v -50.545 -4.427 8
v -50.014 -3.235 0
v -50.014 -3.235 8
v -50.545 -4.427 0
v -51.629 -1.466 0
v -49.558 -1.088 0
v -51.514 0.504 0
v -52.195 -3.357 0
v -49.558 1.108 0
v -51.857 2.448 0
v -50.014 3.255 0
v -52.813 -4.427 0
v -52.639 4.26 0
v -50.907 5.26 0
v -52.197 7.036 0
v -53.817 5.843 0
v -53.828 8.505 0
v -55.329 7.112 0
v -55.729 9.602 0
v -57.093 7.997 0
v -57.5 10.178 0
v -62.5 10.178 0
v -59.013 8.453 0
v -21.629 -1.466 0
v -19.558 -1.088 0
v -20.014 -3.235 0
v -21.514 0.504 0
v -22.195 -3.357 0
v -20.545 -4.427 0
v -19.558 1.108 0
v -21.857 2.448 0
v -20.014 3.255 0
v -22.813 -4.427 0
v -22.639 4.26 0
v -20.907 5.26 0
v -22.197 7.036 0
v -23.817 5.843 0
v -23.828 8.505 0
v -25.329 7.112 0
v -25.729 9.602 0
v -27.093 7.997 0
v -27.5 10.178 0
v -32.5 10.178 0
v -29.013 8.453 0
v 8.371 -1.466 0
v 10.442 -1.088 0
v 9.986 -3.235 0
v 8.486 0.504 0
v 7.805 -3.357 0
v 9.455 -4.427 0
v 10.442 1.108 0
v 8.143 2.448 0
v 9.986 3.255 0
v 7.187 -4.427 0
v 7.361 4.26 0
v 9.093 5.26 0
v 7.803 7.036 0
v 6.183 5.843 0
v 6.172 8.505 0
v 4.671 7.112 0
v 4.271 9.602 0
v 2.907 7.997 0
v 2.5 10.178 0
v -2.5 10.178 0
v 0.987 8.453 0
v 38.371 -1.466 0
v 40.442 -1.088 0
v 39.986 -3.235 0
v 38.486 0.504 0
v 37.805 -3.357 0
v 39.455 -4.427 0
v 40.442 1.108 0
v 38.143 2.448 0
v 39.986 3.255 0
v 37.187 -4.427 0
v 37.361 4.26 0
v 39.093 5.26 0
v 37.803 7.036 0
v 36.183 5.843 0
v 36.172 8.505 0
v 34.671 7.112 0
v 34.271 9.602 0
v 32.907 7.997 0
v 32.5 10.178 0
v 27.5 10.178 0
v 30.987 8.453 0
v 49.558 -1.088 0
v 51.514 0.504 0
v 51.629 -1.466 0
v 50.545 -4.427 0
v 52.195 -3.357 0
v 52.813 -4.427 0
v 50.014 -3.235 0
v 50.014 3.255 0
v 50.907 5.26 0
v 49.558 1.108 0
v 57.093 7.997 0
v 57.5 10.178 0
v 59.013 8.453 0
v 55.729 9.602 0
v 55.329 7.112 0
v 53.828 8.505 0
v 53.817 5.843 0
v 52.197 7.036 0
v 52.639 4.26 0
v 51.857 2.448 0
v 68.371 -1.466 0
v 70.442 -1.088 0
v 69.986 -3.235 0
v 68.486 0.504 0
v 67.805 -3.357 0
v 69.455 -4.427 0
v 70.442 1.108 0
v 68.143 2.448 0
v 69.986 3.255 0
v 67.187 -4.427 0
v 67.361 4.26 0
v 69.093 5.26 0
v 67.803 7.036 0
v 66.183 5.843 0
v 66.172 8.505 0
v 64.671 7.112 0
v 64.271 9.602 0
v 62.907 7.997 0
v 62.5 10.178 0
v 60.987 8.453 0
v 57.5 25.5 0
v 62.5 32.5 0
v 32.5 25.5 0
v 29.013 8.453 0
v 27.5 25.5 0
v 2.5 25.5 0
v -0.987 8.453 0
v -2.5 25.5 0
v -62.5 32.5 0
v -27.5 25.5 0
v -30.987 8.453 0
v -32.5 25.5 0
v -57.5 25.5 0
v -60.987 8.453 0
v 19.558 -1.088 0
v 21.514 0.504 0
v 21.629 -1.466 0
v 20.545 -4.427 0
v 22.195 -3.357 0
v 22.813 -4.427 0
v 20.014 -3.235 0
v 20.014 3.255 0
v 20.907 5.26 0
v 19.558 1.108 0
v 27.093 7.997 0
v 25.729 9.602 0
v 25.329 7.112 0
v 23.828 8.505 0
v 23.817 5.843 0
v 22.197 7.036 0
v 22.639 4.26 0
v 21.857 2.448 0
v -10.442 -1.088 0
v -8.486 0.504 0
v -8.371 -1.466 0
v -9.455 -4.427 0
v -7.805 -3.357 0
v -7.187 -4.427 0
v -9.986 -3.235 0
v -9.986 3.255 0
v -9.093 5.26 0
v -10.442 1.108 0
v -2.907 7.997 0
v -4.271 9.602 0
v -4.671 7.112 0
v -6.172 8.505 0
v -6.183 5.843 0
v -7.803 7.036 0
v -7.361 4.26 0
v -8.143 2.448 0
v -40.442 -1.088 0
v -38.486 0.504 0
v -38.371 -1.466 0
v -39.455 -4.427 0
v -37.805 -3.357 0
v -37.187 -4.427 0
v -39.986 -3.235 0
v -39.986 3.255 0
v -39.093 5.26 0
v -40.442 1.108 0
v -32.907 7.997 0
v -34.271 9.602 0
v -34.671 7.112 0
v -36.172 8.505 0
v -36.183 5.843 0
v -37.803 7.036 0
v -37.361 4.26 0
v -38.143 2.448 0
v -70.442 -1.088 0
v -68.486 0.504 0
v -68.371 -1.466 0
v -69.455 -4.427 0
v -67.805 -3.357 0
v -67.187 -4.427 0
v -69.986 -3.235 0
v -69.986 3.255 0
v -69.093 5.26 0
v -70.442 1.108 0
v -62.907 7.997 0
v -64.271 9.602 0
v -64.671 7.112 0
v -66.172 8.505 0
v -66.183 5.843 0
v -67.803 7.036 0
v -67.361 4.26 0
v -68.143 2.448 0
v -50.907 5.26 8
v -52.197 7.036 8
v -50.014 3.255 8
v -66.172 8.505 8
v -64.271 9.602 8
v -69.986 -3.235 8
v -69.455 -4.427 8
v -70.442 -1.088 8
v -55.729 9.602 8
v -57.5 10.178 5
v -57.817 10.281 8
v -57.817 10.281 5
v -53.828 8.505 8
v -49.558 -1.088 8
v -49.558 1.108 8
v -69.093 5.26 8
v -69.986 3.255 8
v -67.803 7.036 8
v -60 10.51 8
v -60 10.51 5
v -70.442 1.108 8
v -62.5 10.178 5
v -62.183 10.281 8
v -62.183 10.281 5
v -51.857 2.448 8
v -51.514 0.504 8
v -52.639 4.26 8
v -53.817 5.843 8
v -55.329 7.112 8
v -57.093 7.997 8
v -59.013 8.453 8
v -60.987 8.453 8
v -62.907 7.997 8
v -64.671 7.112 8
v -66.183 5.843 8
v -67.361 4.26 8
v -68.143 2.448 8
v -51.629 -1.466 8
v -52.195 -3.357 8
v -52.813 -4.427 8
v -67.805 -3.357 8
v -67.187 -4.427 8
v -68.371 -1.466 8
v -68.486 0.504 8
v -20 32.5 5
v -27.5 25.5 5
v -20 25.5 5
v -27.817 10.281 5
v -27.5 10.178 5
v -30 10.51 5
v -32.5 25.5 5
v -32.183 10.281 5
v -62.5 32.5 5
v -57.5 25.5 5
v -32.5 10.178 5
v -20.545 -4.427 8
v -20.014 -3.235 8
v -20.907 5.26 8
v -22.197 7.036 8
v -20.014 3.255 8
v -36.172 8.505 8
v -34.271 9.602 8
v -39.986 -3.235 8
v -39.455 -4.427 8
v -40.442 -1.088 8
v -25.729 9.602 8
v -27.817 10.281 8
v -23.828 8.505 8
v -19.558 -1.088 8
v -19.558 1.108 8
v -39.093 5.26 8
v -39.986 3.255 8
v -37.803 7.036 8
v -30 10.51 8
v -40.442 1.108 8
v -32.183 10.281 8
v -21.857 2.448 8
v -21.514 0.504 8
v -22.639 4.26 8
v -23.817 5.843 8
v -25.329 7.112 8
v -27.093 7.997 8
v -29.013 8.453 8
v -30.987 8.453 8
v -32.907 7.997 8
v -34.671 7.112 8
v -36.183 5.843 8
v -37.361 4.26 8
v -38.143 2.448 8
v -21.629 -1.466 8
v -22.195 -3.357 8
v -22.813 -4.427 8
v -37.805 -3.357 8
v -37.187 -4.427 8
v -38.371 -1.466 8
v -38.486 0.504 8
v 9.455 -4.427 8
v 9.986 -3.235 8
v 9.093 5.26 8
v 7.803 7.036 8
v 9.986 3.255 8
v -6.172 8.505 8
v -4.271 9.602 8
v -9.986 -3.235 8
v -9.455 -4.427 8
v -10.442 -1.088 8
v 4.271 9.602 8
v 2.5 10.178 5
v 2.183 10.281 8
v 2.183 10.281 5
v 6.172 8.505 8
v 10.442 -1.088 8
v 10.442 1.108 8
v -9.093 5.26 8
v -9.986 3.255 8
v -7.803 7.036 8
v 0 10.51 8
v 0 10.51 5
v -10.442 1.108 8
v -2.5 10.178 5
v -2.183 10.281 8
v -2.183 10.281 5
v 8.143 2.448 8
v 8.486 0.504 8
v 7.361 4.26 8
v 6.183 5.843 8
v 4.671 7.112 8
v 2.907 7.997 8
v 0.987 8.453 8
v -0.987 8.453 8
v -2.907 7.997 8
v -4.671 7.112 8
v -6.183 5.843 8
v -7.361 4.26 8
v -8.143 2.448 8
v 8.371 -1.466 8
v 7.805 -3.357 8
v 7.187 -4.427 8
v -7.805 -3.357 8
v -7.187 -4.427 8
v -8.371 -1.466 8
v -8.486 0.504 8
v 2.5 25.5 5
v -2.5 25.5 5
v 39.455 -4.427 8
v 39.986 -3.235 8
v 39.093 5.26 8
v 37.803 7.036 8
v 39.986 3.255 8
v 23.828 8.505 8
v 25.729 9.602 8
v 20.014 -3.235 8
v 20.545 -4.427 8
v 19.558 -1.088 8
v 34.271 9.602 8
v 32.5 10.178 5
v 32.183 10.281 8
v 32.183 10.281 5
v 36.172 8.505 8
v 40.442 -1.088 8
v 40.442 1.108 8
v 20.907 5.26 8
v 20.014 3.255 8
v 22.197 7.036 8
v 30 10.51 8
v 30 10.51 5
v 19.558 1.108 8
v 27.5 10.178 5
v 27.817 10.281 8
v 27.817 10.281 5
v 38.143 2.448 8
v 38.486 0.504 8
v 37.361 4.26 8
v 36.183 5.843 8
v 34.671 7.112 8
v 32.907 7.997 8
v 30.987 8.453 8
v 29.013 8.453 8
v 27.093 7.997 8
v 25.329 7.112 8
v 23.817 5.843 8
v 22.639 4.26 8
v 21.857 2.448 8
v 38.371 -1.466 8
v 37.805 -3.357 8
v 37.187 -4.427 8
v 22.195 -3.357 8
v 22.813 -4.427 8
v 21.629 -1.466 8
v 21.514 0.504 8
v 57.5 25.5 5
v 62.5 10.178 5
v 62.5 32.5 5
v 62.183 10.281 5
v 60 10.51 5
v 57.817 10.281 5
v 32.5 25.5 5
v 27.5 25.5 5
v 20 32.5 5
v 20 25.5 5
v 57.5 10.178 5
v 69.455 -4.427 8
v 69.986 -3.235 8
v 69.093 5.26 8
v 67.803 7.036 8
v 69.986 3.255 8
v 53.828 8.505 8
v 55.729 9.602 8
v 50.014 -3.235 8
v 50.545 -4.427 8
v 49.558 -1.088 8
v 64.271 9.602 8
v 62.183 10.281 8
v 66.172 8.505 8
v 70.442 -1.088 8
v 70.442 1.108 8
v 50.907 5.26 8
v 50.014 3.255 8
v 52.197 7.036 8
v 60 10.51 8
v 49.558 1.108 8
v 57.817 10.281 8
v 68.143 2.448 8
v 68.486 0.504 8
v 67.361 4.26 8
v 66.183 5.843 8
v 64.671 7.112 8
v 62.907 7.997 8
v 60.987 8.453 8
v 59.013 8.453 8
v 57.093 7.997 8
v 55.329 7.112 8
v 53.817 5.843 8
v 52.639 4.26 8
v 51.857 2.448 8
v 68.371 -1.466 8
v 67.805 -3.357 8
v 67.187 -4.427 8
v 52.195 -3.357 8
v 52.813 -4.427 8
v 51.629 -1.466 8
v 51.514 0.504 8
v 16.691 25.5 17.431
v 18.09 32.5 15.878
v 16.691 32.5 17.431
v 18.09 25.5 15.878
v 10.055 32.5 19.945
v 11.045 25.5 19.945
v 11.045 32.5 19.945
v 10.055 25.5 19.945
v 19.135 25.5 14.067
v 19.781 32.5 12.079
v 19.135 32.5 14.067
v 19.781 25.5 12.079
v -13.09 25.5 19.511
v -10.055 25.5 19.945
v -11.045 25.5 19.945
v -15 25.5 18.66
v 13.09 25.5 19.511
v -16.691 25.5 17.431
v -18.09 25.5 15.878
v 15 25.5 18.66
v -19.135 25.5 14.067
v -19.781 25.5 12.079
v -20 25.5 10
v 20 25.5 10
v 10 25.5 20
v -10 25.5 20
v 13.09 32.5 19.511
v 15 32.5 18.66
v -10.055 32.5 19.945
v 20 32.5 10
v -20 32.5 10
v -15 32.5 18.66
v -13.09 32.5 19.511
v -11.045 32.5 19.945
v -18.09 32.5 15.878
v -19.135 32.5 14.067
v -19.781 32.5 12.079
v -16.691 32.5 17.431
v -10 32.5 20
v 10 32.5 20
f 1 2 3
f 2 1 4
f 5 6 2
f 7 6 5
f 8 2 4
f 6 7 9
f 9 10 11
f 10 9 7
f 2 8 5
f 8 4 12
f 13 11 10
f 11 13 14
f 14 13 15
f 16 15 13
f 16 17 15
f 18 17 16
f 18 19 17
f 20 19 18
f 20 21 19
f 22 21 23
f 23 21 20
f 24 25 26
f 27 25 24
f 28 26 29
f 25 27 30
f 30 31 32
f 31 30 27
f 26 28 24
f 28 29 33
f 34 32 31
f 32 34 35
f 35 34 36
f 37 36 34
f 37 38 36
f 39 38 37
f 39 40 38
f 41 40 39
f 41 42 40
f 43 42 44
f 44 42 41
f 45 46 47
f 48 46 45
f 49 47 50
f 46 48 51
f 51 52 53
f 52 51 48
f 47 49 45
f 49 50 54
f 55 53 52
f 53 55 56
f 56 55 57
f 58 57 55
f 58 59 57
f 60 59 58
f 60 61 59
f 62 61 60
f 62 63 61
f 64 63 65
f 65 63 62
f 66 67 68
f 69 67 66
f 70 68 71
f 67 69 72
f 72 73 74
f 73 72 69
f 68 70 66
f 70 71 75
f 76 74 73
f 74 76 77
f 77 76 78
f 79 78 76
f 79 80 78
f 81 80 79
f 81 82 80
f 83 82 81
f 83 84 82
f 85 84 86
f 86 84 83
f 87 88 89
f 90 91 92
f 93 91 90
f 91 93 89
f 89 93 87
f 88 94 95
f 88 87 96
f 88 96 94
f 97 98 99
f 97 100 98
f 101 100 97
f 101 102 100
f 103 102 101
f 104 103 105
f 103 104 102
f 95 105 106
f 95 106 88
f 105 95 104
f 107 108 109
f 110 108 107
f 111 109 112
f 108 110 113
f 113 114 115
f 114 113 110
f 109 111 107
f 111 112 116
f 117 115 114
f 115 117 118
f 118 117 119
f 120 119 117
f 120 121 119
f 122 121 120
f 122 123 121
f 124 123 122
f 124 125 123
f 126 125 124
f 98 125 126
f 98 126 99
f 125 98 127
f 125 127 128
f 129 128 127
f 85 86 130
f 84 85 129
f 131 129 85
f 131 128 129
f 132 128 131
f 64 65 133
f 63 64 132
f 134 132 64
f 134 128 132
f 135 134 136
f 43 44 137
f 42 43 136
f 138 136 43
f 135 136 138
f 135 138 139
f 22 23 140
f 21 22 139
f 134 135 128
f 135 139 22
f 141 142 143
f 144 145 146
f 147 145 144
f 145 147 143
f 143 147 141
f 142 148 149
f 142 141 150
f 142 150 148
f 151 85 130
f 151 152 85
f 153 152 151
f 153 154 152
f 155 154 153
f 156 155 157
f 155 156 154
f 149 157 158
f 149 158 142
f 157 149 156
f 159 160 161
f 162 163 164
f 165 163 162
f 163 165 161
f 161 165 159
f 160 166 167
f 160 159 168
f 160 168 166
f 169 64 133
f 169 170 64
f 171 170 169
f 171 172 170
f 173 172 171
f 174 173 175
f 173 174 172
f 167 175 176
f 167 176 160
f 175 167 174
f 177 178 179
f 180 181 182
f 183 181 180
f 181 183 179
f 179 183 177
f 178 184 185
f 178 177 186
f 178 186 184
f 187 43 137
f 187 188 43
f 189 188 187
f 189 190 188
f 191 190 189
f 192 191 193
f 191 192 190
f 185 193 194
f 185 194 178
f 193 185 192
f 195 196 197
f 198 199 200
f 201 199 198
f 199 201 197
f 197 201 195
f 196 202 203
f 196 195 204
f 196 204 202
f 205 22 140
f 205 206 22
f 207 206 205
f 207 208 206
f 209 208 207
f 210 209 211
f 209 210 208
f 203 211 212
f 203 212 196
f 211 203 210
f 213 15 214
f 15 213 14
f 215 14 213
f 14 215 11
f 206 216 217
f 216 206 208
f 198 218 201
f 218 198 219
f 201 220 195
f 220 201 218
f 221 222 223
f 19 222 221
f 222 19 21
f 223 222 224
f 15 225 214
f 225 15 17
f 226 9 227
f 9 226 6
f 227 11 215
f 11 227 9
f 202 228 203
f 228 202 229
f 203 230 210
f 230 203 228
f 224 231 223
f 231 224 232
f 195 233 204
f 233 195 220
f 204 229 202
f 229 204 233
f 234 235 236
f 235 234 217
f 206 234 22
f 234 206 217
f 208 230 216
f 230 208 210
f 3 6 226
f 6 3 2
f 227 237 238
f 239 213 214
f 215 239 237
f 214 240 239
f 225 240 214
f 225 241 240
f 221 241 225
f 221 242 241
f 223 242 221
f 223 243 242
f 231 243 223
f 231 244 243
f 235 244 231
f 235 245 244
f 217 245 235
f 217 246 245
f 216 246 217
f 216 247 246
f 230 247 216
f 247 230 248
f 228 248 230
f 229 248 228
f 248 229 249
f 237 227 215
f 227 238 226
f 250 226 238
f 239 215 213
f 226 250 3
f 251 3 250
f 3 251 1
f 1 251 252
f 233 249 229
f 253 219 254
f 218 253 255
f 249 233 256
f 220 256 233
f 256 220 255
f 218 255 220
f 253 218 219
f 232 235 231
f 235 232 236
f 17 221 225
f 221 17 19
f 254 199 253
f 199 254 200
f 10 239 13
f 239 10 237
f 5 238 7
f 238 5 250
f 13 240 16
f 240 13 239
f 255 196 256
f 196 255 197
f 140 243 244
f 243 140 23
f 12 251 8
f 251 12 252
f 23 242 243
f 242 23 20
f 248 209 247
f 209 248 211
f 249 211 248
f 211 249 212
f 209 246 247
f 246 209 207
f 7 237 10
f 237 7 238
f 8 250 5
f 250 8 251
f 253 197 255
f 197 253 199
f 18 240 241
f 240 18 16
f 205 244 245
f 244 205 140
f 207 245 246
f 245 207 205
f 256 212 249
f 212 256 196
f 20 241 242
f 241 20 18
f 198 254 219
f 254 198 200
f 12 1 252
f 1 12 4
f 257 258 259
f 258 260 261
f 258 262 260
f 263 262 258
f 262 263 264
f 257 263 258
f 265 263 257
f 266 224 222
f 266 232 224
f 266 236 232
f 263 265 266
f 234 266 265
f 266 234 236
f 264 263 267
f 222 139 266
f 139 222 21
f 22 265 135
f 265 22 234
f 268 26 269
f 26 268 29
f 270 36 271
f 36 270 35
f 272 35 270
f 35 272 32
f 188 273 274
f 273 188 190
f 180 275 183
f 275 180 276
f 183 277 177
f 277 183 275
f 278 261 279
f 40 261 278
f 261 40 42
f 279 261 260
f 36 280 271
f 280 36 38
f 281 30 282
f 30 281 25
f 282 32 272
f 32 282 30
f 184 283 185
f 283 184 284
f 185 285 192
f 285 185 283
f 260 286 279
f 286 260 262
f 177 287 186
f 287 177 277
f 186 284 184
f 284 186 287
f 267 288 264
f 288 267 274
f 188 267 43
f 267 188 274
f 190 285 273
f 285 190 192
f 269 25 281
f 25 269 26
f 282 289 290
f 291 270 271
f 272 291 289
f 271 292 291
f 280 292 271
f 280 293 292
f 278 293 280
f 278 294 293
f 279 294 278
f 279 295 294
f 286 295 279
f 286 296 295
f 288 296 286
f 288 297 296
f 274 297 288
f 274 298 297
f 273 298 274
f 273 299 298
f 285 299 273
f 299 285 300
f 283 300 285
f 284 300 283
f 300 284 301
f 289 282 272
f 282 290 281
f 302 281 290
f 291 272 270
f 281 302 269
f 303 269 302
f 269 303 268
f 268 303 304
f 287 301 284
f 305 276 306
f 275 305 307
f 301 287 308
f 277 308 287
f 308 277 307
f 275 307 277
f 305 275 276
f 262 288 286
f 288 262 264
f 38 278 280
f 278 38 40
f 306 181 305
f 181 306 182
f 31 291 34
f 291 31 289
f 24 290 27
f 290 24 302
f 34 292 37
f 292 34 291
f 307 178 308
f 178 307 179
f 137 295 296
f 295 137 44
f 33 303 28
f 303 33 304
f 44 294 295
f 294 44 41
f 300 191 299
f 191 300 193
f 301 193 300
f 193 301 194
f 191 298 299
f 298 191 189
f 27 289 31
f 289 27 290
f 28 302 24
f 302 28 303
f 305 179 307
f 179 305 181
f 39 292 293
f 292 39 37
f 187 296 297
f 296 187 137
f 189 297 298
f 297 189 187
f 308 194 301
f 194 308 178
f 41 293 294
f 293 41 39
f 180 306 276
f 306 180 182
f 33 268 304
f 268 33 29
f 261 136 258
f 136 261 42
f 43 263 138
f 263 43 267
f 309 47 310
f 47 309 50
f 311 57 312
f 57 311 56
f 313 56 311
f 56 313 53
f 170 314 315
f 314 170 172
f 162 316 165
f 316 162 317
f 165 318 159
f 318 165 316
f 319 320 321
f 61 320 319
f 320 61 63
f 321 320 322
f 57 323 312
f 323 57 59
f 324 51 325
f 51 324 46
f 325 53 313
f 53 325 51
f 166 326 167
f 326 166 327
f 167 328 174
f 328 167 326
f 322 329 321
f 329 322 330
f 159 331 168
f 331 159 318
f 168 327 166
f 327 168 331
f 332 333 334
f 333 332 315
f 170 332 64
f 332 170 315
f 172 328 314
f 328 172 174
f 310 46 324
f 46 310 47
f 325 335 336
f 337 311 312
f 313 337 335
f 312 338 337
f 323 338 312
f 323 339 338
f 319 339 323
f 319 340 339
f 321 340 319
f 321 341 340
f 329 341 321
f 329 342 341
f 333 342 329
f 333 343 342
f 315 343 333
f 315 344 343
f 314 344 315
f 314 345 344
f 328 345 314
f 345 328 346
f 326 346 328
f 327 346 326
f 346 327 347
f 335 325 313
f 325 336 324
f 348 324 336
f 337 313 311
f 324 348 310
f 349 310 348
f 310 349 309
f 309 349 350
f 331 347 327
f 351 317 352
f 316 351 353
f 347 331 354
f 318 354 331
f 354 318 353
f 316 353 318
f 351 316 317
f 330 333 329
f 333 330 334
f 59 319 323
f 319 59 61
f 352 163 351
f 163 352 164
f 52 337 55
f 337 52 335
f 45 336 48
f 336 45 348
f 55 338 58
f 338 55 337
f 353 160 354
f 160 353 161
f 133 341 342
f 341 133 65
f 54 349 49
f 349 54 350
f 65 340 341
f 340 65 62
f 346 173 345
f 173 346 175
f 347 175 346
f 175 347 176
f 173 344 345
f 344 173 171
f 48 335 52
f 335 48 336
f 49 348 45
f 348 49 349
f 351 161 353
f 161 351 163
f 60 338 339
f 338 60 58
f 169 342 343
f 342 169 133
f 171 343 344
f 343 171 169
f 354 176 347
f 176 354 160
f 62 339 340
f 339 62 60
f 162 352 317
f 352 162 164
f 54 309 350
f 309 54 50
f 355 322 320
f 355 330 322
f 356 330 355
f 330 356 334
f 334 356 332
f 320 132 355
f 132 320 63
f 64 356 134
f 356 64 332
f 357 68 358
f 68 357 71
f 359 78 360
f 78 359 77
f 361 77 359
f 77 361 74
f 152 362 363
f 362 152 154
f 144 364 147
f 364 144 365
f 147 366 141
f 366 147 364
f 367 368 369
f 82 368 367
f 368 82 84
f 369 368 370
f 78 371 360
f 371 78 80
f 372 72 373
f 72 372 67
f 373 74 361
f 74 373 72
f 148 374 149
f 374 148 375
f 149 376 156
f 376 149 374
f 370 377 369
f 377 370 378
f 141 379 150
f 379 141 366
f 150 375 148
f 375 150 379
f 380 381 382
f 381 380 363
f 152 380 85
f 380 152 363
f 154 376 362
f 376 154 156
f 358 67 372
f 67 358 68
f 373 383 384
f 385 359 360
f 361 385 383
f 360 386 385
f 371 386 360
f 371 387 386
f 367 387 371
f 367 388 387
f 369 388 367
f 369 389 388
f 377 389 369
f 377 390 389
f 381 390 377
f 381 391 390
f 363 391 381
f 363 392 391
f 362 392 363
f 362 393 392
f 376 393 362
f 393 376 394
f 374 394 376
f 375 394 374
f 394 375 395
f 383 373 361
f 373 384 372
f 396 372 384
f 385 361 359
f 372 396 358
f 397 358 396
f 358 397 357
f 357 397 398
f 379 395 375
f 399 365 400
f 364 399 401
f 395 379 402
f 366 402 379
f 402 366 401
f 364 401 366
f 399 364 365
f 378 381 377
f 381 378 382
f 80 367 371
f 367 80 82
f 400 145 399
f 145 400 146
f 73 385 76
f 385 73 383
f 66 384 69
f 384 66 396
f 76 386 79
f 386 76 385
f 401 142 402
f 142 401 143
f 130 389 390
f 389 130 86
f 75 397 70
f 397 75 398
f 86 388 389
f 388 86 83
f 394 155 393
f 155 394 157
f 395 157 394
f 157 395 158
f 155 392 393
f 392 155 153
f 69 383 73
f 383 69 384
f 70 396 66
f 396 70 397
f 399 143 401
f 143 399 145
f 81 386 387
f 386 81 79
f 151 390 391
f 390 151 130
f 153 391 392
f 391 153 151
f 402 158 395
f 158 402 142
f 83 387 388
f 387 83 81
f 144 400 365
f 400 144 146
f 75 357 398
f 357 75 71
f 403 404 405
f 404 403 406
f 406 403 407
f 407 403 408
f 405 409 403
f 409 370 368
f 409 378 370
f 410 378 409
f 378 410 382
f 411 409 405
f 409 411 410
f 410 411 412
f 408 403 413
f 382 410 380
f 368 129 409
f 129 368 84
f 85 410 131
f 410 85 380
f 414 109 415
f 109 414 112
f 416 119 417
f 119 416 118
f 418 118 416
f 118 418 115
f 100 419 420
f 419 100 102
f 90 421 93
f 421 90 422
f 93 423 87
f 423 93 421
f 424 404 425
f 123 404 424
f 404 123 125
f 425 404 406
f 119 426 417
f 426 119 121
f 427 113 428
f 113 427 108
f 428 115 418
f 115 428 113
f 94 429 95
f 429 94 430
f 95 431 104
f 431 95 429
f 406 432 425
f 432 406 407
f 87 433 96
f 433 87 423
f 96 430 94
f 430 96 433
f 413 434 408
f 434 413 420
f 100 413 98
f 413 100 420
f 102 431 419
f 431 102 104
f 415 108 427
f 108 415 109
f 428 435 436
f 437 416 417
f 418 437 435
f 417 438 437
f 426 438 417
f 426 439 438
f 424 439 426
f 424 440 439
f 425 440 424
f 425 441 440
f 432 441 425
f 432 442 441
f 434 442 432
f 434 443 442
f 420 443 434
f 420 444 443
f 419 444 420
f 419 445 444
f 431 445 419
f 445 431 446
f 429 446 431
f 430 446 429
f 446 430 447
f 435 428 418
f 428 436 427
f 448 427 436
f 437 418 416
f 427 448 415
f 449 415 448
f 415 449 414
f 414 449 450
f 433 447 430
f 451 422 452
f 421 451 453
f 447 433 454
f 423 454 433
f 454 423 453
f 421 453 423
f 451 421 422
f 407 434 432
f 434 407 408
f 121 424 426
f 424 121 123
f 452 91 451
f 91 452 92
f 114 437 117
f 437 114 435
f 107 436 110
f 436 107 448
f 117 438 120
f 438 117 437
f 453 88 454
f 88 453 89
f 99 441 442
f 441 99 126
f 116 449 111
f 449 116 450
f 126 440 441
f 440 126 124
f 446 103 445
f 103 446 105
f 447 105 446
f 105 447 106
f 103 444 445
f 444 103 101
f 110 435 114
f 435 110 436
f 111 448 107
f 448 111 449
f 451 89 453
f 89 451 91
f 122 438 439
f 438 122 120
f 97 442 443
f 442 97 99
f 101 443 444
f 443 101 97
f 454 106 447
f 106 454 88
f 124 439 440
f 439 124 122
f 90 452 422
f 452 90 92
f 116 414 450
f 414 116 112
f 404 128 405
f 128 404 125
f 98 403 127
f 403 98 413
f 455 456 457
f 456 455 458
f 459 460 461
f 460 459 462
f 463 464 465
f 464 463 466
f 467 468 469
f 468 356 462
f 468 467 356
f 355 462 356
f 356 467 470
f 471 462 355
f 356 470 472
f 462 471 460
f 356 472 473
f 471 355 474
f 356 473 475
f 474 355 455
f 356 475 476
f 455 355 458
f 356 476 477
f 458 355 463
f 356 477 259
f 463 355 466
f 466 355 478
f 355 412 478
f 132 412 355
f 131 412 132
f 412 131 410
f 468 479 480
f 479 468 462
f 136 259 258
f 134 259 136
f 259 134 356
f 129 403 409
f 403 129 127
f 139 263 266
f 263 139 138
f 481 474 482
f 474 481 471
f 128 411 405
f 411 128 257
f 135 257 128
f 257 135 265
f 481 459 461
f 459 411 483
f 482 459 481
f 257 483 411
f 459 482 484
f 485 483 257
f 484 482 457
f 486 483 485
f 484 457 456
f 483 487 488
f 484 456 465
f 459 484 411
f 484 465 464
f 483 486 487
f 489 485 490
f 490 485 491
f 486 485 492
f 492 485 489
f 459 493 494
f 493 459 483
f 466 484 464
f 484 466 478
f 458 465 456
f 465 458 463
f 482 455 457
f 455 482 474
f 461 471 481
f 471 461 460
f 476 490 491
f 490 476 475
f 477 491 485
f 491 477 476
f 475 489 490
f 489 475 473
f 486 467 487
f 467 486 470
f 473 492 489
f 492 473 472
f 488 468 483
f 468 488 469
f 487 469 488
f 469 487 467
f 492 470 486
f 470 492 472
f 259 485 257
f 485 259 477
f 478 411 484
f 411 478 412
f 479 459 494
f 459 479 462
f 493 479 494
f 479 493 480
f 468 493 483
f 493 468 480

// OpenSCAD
/*
 * Parallel Line Jig
 *
 * by Alex Franke (CodeCreations), Oct 2012
 * http://www.theFrankes.com
 * 
 * Licenced under Creative Commons Attribution - Non-Commercial - Share Alike 3.0 
 * 
 * INSTRUCTIONS: Choose some values in the "User-defined values" section, render, and print.
 *   It works well to hold the jig between your thumb and index finger as you pull it across 
 *   the drawing surface.  
 * 
 * THING: http://www.thingiverse.com/thing:31061
 * 
 * v1.00, Oct 3, 2012: Initial release. 
 *
 * TODO: 
 *   * Include keyholes for hanging 
 */

/////////////////////////////////////////////////////////////////////////////
// User-defined values... 
/////////////////////////////////////////////////////////////////////////////
numberOfLines   = 5;    // Total number of pen holders
distanceApart   = 30;   // The distance between parallel lines

penDiameter     = 17;   // The diameter of the writing implement
clampHeight     = 8;    // The height of the writing implement grips  
clampThickness  = 2;    // The thickness of the material that grips the writing implement
gripLength      = 2.5;  // The distance the grips wrap around the writing implements

frameThickness  = 5;    // The thickness of the bars that attach the grips to the handle
frameLength     = 15;   // The distance the grips extend from the handle

handleHeight    = 20;   // The height of the handle
handleThickness = 7;    // The thickness of the handle
handleLength    = 40;   // The length of the handle
handleRadius    = 10;   // The radius of the curve on the upper corners of the handle

rotation        = 0;    // The amount the entire piece will be rotated on the print bed. 


/////////////////////////////////////////////////////////////////////////////
// The code... 
/////////////////////////////////////////////////////////////////////////////

rotate([0,0,-90+rotation]) 
union() {

	clamps(); 
	
	translate([-penDiameter/2-clampThickness-frameLength,0,0]) 
		rotate([90,0,-90]) 
			handle(); 
}

module handle() {
	union() {
		translate([-handleLength/2,0,0]) 
			linear_extrude(height=handleThickness)
				polygon(points=[
					[0,0],
					[0,handleHeight-handleRadius],
					[handleRadius,handleHeight],
					[handleLength-handleRadius,handleHeight],
					[handleLength,handleHeight-handleRadius],
					[handleLength,0]
					]);

		for( i=[-1,1] ) {
			translate([(handleLength/2 - handleRadius)*i,handleHeight-handleRadius,0]) 
				difference() {
					cylinder(h=handleThickness, r=handleRadius);
					translate([0,-handleRadius/2,handleThickness/2]) 
						cube([handleRadius*2,handleRadius,handleThickness+1], center=true);
				}
		}

		translate([0,frameThickness/2,handleThickness/2]) 
		cube([distanceApart*(numberOfLines-1)+frameThickness,frameThickness,handleThickness], center=true);
	}
}

module clamps() {
	translate([-0.01, -((numberOfLines-1)*distanceApart)/2,0]) 
	for( i=[0:numberOfLines-1] ) {
		translate([0,distanceApart*i,0]) {
			union() {
				translate([0,0,clampHeight/2]) 
					rodClamp(penDiameter, clampThickness, clampHeight, penDiameter-gripLength);
				translate([-(frameLength+clampThickness+penDiameter)/2,0,frameThickness/2]) 
					cube([frameLength+clampThickness, frameThickness, frameThickness], center=true);
			}
		}
	}
}

// Taken from my SnapConnectors project
module rodClamp(rodDiameter=8, thickness=2, length=8, opening=6) {
	dist = sqrt( pow(rodDiameter/2,2) - pow(opening/2,2) );
	difference() {
		cylinder(h=length, r=rodDiameter/2 + thickness, center=true);
		cylinder(h=length+1, r=rodDiameter/2, center=true);
		translate([dist + (rodDiameter/2 + thickness +1)/2,0,0]) 
			cube([rodDiameter/2 + thickness +1,rodDiameter + thickness*2 +1,length+1], center=true);
	}
}
